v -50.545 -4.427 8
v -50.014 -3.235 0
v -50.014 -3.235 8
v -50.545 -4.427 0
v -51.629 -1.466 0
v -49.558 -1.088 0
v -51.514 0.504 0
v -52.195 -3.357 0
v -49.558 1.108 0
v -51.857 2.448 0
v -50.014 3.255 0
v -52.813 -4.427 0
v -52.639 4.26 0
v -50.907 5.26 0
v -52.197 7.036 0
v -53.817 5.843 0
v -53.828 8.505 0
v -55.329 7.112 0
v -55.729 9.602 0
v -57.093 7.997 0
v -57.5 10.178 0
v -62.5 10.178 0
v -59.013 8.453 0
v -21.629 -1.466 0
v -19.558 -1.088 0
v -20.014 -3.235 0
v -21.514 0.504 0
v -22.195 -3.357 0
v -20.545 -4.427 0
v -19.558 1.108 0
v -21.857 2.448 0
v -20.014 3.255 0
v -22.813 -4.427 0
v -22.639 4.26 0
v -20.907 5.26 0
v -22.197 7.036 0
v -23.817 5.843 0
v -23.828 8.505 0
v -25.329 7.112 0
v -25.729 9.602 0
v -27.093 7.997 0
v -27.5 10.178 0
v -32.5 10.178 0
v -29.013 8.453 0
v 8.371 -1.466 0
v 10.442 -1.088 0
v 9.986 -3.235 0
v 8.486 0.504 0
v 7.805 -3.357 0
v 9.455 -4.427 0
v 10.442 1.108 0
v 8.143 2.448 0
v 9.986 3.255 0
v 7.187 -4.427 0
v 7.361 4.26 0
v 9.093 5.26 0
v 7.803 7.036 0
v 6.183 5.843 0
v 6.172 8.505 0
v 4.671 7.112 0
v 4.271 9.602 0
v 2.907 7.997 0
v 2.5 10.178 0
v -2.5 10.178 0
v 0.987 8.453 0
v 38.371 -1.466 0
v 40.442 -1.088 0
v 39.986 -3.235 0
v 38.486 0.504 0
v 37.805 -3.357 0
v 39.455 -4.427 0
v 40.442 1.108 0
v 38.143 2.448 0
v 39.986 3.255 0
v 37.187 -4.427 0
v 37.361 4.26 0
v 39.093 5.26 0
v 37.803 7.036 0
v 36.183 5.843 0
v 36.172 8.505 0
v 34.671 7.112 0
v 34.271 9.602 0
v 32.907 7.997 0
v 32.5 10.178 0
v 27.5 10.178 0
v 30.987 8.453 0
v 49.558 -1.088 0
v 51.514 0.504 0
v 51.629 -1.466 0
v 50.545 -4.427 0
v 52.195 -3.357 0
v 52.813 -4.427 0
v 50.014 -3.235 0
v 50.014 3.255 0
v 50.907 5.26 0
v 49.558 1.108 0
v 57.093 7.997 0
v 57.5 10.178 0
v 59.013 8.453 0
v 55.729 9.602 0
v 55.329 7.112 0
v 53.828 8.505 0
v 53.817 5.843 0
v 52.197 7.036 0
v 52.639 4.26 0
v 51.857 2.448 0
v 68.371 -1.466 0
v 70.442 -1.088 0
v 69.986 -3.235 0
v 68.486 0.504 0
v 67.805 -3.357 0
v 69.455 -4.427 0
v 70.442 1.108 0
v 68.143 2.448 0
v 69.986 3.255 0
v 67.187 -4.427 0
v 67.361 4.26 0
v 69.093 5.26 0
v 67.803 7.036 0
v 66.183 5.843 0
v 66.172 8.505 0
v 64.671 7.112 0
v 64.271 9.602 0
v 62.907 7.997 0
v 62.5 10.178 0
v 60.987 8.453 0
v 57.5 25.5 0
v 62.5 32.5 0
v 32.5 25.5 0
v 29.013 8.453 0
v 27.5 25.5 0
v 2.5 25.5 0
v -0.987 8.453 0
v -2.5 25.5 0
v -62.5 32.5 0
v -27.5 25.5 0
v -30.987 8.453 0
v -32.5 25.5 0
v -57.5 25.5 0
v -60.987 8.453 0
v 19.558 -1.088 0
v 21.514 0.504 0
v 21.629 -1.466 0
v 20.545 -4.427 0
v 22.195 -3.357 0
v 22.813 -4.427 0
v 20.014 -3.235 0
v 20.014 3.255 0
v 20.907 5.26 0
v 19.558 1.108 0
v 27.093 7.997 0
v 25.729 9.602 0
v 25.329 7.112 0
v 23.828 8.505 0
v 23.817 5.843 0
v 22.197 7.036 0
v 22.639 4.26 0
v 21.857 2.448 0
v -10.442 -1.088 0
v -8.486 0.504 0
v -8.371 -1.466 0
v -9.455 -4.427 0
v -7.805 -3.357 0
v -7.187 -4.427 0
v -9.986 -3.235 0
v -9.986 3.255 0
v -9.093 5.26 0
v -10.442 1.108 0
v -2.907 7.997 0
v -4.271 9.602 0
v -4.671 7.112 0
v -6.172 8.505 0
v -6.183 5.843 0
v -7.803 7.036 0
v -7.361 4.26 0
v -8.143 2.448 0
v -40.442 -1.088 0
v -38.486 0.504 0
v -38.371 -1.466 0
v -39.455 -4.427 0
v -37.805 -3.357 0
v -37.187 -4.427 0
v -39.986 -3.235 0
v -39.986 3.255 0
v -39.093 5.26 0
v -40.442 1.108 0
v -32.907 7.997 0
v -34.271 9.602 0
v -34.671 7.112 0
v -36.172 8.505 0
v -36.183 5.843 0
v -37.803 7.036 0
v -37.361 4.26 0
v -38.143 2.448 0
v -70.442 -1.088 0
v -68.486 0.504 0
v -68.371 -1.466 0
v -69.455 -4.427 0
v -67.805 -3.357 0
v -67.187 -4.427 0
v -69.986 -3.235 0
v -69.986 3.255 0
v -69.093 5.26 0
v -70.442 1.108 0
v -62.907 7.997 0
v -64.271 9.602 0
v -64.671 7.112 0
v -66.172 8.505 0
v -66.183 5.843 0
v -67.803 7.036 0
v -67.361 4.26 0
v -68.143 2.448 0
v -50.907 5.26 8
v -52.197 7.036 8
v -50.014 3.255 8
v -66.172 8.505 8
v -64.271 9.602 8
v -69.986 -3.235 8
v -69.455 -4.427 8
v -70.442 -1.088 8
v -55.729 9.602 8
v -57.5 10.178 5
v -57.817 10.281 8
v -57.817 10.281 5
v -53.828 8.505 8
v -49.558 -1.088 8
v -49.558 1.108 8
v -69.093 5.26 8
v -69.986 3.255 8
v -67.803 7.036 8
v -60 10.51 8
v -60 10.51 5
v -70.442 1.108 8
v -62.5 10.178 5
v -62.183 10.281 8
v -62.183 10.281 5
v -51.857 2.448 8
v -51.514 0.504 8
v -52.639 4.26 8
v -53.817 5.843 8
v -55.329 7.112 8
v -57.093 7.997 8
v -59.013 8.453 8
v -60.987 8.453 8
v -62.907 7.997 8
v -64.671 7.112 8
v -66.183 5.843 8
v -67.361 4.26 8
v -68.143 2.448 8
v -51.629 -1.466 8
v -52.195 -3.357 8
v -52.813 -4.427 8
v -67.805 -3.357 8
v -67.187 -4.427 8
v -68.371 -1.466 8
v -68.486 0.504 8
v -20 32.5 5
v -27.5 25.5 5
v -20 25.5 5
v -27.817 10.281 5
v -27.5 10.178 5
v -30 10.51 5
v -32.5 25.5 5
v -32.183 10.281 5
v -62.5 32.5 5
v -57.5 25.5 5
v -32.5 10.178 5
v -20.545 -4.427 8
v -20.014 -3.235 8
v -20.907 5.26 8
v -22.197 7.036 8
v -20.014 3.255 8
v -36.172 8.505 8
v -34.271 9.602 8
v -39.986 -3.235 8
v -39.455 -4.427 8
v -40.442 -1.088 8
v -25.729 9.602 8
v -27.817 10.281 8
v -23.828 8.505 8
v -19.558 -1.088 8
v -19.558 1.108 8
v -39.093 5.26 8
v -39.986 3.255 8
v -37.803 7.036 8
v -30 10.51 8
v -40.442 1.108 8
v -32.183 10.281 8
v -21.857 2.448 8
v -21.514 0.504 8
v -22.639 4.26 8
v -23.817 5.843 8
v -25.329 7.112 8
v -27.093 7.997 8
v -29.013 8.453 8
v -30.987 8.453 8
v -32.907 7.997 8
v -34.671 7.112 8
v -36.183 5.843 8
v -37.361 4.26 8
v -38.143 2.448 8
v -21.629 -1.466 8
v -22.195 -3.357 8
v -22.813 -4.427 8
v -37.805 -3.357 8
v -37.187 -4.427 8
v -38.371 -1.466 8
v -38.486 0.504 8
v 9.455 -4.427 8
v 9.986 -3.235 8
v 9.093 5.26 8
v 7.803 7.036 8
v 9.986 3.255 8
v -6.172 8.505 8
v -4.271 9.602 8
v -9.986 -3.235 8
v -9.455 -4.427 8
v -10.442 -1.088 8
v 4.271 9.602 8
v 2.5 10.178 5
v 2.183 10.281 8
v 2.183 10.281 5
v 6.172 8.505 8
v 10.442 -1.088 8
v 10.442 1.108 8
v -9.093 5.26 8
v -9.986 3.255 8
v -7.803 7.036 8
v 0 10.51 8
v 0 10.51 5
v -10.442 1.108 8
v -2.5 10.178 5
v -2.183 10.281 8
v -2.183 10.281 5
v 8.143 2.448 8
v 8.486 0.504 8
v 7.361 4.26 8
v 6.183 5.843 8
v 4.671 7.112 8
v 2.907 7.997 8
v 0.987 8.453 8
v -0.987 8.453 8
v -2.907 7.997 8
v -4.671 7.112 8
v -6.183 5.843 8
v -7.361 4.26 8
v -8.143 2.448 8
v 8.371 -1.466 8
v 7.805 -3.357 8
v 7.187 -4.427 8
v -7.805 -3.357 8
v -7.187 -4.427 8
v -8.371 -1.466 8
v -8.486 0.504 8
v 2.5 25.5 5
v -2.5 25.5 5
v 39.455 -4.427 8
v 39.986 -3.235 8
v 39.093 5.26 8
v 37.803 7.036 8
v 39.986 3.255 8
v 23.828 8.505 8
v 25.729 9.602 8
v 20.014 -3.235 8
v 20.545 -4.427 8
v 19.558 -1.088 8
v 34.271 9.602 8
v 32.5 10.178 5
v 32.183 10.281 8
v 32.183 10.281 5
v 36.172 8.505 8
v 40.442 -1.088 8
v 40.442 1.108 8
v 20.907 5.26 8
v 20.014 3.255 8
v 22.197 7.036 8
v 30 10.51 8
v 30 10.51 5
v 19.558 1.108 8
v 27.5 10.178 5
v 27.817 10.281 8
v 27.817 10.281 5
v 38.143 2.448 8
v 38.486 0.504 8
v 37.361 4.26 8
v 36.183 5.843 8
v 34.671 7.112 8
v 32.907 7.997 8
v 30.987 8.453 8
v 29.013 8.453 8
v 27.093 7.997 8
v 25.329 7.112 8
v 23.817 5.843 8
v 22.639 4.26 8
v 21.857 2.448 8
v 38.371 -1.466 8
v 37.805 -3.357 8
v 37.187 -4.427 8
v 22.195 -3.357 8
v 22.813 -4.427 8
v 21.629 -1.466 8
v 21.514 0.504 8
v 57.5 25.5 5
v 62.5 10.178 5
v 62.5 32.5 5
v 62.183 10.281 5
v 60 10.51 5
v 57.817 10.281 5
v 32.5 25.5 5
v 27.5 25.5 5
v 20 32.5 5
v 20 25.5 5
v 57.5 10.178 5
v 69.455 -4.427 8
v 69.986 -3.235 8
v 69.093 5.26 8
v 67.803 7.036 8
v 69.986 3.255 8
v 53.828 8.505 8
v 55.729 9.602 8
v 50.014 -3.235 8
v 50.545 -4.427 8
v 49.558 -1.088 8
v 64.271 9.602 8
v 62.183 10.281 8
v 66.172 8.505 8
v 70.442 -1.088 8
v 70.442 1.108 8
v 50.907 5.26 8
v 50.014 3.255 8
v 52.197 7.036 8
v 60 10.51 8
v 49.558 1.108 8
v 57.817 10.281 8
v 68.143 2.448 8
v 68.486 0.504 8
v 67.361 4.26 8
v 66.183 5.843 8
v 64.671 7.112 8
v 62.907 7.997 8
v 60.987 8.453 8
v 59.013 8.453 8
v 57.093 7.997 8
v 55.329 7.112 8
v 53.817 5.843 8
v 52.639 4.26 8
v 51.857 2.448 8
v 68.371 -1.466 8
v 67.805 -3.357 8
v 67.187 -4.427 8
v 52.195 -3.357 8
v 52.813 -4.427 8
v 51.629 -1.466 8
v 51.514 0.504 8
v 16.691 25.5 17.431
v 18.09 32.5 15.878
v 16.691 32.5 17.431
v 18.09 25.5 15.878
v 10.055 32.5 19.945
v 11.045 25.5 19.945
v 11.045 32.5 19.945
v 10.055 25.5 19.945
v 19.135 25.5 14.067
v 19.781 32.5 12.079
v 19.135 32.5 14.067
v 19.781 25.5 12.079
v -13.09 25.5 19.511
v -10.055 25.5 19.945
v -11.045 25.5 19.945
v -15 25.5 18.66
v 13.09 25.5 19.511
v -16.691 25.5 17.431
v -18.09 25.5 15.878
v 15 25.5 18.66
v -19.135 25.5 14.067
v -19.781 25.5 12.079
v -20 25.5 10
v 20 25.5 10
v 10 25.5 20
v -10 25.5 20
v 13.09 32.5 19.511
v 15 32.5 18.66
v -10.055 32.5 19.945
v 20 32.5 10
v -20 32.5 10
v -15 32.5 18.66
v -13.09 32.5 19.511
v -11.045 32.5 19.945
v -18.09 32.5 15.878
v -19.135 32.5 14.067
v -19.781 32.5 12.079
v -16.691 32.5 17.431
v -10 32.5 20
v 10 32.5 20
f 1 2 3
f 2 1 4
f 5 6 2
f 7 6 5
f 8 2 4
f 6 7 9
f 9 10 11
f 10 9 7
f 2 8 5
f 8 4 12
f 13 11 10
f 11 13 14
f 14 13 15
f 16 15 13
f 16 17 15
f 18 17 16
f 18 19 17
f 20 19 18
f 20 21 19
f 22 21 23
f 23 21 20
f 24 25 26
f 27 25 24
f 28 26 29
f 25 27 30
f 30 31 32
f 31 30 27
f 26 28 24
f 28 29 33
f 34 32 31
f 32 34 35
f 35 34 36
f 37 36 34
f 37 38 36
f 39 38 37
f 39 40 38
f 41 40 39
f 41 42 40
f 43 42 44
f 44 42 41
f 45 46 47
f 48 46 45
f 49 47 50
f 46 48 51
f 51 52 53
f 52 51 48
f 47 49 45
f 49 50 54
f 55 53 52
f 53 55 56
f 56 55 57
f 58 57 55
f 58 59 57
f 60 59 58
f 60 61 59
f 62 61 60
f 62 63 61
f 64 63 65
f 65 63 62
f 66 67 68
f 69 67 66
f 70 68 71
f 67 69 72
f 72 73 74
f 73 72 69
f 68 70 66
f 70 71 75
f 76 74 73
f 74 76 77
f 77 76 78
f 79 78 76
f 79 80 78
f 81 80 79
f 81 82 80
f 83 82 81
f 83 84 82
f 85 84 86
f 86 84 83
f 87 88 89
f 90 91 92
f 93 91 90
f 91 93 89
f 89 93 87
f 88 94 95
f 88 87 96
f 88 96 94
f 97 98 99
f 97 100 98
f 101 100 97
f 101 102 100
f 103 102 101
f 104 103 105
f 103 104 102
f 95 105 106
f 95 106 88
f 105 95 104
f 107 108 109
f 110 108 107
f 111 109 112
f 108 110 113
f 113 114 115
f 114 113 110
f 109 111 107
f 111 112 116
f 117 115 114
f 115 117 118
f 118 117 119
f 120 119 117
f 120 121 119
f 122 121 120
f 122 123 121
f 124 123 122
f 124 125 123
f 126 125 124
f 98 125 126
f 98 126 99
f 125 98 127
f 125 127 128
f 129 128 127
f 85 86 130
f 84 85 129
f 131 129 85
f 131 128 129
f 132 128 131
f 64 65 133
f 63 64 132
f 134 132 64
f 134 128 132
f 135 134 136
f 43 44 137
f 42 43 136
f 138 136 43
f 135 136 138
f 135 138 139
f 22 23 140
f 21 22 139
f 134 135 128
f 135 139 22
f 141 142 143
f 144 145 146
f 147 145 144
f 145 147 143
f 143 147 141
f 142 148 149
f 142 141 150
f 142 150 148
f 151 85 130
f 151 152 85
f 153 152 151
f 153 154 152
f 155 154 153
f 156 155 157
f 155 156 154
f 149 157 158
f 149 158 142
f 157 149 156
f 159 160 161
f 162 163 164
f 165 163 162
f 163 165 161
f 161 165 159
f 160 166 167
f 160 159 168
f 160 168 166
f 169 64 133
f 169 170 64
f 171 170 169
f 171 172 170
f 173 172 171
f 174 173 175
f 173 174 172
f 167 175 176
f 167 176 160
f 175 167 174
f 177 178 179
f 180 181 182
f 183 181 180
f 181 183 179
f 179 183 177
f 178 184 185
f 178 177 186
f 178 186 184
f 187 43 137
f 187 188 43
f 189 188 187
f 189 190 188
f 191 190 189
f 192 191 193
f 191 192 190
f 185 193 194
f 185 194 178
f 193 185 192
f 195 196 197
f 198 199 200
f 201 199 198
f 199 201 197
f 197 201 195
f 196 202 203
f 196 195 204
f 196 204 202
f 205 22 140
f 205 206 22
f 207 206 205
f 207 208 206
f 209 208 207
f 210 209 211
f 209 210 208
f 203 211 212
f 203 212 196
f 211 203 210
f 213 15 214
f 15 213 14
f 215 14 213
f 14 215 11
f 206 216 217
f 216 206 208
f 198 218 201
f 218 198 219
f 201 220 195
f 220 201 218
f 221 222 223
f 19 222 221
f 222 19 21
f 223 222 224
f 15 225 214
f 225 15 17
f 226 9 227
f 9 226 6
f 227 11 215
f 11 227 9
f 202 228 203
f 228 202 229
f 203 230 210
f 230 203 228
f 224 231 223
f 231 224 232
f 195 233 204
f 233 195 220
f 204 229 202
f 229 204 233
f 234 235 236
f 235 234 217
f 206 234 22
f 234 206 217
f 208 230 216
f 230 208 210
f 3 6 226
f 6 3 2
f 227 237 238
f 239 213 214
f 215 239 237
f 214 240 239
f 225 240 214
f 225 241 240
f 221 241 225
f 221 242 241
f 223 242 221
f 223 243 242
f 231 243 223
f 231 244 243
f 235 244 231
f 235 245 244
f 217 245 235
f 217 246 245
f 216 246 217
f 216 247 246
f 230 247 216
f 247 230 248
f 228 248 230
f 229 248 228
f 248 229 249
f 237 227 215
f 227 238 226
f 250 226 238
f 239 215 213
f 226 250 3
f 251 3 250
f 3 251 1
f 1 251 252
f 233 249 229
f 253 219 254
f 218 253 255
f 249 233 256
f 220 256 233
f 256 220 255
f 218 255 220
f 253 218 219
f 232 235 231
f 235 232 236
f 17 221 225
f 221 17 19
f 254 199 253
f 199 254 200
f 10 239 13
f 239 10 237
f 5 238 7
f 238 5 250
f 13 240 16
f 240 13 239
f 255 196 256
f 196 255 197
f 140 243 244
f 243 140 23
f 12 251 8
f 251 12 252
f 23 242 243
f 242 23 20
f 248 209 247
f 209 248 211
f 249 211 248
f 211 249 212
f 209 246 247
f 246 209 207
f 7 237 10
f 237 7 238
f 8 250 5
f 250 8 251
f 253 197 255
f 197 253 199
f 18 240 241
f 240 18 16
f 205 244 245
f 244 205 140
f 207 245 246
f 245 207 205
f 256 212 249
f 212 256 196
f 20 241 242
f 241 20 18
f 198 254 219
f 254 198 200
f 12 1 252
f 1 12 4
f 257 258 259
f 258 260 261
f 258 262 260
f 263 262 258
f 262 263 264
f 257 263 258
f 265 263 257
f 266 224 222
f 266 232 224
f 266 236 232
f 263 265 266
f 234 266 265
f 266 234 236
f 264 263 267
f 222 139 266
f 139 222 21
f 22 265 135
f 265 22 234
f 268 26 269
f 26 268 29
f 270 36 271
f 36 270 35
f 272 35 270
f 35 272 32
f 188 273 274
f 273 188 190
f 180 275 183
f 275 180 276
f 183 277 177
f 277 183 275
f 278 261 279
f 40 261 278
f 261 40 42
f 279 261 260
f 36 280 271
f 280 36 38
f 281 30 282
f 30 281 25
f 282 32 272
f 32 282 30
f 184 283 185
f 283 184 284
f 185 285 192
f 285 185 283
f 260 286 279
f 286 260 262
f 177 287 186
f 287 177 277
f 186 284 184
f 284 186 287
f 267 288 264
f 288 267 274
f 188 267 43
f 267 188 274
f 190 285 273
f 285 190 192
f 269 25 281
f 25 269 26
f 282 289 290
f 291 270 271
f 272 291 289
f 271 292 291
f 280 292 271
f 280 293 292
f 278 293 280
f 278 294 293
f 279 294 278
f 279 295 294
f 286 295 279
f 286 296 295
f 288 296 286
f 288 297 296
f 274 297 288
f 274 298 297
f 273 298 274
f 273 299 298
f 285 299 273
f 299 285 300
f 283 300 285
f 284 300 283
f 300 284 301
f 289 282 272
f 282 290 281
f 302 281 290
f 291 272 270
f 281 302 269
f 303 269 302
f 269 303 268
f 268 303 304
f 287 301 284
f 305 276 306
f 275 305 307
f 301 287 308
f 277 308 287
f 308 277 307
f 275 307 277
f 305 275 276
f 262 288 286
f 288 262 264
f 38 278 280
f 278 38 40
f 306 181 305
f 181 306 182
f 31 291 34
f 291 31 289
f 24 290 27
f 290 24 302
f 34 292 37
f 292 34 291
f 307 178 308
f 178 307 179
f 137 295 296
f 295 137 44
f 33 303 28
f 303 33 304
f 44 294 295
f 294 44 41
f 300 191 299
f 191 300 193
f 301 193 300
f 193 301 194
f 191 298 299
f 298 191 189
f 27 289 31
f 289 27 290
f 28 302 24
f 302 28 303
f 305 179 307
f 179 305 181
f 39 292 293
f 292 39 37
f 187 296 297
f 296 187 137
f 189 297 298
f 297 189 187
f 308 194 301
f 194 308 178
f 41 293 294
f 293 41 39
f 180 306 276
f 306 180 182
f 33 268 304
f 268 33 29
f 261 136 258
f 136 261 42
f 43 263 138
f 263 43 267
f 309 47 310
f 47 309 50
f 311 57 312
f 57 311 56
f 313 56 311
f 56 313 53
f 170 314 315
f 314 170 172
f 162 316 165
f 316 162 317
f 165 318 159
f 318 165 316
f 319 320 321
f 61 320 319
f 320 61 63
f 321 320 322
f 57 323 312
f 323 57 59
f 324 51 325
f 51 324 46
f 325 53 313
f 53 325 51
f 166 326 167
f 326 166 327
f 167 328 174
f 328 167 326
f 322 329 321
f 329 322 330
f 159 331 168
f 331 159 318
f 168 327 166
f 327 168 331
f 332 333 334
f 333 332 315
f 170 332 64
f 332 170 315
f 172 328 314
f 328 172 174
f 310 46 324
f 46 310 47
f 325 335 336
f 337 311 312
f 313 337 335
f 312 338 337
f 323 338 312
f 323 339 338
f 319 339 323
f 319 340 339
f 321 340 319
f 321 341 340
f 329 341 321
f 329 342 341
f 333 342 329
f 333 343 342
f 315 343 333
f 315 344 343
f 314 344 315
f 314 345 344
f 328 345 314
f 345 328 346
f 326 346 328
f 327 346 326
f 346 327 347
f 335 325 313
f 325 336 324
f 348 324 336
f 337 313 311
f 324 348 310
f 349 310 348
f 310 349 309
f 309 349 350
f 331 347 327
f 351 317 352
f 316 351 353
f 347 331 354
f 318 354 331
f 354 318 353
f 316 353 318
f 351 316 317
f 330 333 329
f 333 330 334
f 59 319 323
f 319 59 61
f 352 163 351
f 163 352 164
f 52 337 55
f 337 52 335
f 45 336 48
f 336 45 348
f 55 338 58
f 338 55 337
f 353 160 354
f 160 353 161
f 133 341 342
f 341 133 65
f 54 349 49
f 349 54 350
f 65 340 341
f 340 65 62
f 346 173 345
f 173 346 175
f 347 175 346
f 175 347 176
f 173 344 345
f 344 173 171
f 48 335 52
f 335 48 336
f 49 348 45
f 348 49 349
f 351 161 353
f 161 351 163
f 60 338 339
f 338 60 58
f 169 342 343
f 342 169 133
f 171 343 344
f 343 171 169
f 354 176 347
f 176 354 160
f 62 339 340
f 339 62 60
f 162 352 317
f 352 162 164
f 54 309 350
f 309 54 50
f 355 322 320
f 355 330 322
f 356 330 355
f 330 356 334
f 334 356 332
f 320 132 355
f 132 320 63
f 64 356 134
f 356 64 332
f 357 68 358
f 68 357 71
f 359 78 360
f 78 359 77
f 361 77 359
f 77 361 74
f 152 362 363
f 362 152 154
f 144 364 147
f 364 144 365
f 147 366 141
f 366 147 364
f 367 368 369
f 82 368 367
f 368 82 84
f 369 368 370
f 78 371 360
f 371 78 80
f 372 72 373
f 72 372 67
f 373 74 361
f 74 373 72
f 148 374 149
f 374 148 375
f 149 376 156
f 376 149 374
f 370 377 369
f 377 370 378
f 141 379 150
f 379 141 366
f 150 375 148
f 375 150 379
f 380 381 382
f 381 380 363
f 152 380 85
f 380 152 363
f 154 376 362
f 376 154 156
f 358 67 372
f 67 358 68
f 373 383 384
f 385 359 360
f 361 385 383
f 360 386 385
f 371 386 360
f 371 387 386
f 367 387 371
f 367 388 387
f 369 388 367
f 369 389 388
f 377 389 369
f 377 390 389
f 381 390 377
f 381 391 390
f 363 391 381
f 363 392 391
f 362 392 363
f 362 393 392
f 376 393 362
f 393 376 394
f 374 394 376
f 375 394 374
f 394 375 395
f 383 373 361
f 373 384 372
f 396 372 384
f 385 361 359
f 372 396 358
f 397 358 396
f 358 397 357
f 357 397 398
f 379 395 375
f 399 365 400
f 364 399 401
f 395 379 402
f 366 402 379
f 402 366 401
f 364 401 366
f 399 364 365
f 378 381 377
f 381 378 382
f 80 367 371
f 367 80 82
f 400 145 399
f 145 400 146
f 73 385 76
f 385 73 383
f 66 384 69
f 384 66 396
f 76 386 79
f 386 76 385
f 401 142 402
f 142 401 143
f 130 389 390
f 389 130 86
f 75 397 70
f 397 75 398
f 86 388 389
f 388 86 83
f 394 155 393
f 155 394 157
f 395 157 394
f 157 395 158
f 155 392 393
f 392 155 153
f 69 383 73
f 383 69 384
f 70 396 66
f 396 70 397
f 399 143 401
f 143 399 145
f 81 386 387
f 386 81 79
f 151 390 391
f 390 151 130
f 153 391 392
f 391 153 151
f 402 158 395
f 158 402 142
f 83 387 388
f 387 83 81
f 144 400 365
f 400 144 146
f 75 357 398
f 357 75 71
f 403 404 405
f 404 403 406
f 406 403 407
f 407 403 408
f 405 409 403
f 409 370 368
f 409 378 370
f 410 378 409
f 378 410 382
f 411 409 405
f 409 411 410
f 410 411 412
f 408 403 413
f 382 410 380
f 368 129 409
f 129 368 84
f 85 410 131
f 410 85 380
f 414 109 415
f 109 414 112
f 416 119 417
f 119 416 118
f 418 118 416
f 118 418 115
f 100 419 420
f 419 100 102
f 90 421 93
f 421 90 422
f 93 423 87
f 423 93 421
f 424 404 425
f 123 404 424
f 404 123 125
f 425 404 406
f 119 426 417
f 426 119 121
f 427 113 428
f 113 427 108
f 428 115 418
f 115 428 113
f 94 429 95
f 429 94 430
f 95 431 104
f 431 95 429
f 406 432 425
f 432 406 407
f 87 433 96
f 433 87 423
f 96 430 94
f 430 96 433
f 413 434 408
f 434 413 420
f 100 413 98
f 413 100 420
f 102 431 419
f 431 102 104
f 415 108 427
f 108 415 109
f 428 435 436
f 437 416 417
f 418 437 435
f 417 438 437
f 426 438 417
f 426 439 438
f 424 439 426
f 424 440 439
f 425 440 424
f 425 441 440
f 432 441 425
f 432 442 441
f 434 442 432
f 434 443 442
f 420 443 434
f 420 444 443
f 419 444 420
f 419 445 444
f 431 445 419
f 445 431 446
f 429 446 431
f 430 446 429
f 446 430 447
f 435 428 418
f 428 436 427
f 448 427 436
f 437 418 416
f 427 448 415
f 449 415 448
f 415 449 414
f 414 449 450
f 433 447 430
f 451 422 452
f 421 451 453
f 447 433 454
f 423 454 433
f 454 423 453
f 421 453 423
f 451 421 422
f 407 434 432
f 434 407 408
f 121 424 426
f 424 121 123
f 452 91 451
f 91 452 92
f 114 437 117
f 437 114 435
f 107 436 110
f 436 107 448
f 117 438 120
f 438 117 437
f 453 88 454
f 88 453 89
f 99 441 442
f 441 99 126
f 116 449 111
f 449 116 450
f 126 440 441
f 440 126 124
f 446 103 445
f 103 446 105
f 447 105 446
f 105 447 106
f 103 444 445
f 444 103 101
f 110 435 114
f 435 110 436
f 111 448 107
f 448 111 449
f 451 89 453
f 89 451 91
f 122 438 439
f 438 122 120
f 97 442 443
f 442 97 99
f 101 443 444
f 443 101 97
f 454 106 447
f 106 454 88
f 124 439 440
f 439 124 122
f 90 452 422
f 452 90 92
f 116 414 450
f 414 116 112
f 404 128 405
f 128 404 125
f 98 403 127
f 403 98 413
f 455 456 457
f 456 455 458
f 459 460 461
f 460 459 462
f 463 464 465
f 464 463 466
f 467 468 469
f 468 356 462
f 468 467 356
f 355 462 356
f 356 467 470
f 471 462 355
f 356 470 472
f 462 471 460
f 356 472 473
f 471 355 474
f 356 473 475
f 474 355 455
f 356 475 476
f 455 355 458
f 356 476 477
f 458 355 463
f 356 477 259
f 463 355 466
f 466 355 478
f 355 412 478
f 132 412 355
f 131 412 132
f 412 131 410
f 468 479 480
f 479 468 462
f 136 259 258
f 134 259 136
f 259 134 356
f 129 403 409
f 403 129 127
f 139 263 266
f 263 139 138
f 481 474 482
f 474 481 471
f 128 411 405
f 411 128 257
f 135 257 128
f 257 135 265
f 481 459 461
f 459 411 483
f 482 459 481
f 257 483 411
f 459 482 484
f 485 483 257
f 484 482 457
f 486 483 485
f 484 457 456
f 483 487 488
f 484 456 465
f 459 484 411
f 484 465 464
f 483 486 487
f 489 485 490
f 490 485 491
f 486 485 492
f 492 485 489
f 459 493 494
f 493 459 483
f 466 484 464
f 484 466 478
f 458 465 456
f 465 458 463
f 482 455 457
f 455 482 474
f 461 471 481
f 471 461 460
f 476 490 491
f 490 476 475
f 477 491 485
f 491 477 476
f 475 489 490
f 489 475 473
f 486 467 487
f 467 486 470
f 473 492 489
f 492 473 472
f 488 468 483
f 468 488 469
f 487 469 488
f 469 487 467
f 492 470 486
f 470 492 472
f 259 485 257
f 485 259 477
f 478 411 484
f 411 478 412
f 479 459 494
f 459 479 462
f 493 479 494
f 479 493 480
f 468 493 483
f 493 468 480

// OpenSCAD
/*
 * Parallel Line Jig
 *
 * by Alex Franke (CodeCreations), Oct 2012
 * http://www.theFrankes.com
 * 
 * Licenced under Creative Commons Attribution - Non-Commercial - Share Alike 3.0 
 * 
 * INSTRUCTIONS: Choose some values in the "User-defined values" section, render, and print.
 *   It works well to hold the jig between your thumb and index finger as you pull it across 
 *   the drawing surface.  
 * 
 * THING: http://www.thingiverse.com/thing:31061
 * 
 * v1.00, Oct 3, 2012: Initial release. 
 *
 * TODO: 
 *   * Include keyholes for hanging 
 */

/////////////////////////////////////////////////////////////////////////////
// User-defined values... 
/////////////////////////////////////////////////////////////////////////////
numberOfLines   = 5;    // Total number of pen holders
distanceApart   = 30;   // The distance between parallel lines

penDiameter     = 17;   // The diameter of the writing implement
clampHeight     = 8;    // The height of the writing implement grips  
clampThickness  = 2;    // The thickness of the material that grips the writing implement
gripLength      = 2.5;  // The distance the grips wrap around the writing implements

frameThickness  = 5;    // The thickness of the bars that attach the grips to the handle
frameLength     = 15;   // The distance the grips extend from the handle

handleHeight    = 20;   // The height of the handle
handleThickness = 7;    // The thickness of the handle
handleLength    = 40;   // The length of the handle
handleRadius    = 10;   // The radius of the curve on the upper corners of the handle

rotation        = 0;    // The amount the entire piece will be rotated on the print bed. 


/////////////////////////////////////////////////////////////////////////////
// The code... 
/////////////////////////////////////////////////////////////////////////////

rotate([0,0,-90+rotation]) 
union() {

	clamps(); 
	
	translate([-penDiameter/2-clampThickness-frameLength,0,0]) 
		rotate([90,0,-90]) 
			handle(); 
}

module handle() {
	union() {
		translate([-handleLength/2,0,0]) 
			linear_extrude(height=handleThickness)
				polygon(points=[
					[0,0],
					[0,handleHeight-handleRadius],
					[handleRadius,handleHeight],
					[handleLength-handleRadius,handleHeight],
					[handleLength,handleHeight-handleRadius],
					[handleLength,0]
					]);

		for( i=[-1,1] ) {
			translate([(handleLength/2 - handleRadius)*i,handleHeight-handleRadius,0]) 
				difference() {
					cylinder(h=handleThickness, r=handleRadius);
					translate([0,-handleRadius/2,handleThickness/2]) 
						cube([handleRadius*2,handleRadius,handleThickness+1], center=true);
				}
		}

		translate([0,frameThickness/2,handleThickness/2]) 
		cube([distanceApart*(numberOfLines-1)+frameThickness,frameThickness,handleThickness], center=true);
	}
}

module clamps() {
	translate([-0.01, -((numberOfLines-1)*distanceApart)/2,0]) 
	for( i=[0:numberOfLines-1] ) {
		translate([0,distanceApart*i,0]) {
			union() {
				translate([0,0,clampHeight/2]) 
					rodClamp(penDiameter, clampThickness, clampHeight, penDiameter-gripLength);
				translate([-(frameLength+clampThickness+penDiameter)/2,0,frameThickness/2]) 
					cube([frameLength+clampThickness, frameThickness, frameThickness], center=true);
			}
		}
	}
}

// Taken from my SnapConnectors project
module rodClamp(rodDiameter=8, thickness=2, length=8, opening=6) {
	dist = sqrt( pow(rodDiameter/2,2) - pow(opening/2,2) );
	difference() {
		cylinder(h=length, r=rodDiameter/2 + thickness, center=true);
		cylinder(h=length+1, r=rodDiameter/2, center=true);
		translate([dist + (rodDiameter/2 + thickness +1)/2,0,0]) 
			cube([rodDiameter/2 + thickness +1,rodDiameter + thickness*2 +1,length+1], center=true);
	}
}
